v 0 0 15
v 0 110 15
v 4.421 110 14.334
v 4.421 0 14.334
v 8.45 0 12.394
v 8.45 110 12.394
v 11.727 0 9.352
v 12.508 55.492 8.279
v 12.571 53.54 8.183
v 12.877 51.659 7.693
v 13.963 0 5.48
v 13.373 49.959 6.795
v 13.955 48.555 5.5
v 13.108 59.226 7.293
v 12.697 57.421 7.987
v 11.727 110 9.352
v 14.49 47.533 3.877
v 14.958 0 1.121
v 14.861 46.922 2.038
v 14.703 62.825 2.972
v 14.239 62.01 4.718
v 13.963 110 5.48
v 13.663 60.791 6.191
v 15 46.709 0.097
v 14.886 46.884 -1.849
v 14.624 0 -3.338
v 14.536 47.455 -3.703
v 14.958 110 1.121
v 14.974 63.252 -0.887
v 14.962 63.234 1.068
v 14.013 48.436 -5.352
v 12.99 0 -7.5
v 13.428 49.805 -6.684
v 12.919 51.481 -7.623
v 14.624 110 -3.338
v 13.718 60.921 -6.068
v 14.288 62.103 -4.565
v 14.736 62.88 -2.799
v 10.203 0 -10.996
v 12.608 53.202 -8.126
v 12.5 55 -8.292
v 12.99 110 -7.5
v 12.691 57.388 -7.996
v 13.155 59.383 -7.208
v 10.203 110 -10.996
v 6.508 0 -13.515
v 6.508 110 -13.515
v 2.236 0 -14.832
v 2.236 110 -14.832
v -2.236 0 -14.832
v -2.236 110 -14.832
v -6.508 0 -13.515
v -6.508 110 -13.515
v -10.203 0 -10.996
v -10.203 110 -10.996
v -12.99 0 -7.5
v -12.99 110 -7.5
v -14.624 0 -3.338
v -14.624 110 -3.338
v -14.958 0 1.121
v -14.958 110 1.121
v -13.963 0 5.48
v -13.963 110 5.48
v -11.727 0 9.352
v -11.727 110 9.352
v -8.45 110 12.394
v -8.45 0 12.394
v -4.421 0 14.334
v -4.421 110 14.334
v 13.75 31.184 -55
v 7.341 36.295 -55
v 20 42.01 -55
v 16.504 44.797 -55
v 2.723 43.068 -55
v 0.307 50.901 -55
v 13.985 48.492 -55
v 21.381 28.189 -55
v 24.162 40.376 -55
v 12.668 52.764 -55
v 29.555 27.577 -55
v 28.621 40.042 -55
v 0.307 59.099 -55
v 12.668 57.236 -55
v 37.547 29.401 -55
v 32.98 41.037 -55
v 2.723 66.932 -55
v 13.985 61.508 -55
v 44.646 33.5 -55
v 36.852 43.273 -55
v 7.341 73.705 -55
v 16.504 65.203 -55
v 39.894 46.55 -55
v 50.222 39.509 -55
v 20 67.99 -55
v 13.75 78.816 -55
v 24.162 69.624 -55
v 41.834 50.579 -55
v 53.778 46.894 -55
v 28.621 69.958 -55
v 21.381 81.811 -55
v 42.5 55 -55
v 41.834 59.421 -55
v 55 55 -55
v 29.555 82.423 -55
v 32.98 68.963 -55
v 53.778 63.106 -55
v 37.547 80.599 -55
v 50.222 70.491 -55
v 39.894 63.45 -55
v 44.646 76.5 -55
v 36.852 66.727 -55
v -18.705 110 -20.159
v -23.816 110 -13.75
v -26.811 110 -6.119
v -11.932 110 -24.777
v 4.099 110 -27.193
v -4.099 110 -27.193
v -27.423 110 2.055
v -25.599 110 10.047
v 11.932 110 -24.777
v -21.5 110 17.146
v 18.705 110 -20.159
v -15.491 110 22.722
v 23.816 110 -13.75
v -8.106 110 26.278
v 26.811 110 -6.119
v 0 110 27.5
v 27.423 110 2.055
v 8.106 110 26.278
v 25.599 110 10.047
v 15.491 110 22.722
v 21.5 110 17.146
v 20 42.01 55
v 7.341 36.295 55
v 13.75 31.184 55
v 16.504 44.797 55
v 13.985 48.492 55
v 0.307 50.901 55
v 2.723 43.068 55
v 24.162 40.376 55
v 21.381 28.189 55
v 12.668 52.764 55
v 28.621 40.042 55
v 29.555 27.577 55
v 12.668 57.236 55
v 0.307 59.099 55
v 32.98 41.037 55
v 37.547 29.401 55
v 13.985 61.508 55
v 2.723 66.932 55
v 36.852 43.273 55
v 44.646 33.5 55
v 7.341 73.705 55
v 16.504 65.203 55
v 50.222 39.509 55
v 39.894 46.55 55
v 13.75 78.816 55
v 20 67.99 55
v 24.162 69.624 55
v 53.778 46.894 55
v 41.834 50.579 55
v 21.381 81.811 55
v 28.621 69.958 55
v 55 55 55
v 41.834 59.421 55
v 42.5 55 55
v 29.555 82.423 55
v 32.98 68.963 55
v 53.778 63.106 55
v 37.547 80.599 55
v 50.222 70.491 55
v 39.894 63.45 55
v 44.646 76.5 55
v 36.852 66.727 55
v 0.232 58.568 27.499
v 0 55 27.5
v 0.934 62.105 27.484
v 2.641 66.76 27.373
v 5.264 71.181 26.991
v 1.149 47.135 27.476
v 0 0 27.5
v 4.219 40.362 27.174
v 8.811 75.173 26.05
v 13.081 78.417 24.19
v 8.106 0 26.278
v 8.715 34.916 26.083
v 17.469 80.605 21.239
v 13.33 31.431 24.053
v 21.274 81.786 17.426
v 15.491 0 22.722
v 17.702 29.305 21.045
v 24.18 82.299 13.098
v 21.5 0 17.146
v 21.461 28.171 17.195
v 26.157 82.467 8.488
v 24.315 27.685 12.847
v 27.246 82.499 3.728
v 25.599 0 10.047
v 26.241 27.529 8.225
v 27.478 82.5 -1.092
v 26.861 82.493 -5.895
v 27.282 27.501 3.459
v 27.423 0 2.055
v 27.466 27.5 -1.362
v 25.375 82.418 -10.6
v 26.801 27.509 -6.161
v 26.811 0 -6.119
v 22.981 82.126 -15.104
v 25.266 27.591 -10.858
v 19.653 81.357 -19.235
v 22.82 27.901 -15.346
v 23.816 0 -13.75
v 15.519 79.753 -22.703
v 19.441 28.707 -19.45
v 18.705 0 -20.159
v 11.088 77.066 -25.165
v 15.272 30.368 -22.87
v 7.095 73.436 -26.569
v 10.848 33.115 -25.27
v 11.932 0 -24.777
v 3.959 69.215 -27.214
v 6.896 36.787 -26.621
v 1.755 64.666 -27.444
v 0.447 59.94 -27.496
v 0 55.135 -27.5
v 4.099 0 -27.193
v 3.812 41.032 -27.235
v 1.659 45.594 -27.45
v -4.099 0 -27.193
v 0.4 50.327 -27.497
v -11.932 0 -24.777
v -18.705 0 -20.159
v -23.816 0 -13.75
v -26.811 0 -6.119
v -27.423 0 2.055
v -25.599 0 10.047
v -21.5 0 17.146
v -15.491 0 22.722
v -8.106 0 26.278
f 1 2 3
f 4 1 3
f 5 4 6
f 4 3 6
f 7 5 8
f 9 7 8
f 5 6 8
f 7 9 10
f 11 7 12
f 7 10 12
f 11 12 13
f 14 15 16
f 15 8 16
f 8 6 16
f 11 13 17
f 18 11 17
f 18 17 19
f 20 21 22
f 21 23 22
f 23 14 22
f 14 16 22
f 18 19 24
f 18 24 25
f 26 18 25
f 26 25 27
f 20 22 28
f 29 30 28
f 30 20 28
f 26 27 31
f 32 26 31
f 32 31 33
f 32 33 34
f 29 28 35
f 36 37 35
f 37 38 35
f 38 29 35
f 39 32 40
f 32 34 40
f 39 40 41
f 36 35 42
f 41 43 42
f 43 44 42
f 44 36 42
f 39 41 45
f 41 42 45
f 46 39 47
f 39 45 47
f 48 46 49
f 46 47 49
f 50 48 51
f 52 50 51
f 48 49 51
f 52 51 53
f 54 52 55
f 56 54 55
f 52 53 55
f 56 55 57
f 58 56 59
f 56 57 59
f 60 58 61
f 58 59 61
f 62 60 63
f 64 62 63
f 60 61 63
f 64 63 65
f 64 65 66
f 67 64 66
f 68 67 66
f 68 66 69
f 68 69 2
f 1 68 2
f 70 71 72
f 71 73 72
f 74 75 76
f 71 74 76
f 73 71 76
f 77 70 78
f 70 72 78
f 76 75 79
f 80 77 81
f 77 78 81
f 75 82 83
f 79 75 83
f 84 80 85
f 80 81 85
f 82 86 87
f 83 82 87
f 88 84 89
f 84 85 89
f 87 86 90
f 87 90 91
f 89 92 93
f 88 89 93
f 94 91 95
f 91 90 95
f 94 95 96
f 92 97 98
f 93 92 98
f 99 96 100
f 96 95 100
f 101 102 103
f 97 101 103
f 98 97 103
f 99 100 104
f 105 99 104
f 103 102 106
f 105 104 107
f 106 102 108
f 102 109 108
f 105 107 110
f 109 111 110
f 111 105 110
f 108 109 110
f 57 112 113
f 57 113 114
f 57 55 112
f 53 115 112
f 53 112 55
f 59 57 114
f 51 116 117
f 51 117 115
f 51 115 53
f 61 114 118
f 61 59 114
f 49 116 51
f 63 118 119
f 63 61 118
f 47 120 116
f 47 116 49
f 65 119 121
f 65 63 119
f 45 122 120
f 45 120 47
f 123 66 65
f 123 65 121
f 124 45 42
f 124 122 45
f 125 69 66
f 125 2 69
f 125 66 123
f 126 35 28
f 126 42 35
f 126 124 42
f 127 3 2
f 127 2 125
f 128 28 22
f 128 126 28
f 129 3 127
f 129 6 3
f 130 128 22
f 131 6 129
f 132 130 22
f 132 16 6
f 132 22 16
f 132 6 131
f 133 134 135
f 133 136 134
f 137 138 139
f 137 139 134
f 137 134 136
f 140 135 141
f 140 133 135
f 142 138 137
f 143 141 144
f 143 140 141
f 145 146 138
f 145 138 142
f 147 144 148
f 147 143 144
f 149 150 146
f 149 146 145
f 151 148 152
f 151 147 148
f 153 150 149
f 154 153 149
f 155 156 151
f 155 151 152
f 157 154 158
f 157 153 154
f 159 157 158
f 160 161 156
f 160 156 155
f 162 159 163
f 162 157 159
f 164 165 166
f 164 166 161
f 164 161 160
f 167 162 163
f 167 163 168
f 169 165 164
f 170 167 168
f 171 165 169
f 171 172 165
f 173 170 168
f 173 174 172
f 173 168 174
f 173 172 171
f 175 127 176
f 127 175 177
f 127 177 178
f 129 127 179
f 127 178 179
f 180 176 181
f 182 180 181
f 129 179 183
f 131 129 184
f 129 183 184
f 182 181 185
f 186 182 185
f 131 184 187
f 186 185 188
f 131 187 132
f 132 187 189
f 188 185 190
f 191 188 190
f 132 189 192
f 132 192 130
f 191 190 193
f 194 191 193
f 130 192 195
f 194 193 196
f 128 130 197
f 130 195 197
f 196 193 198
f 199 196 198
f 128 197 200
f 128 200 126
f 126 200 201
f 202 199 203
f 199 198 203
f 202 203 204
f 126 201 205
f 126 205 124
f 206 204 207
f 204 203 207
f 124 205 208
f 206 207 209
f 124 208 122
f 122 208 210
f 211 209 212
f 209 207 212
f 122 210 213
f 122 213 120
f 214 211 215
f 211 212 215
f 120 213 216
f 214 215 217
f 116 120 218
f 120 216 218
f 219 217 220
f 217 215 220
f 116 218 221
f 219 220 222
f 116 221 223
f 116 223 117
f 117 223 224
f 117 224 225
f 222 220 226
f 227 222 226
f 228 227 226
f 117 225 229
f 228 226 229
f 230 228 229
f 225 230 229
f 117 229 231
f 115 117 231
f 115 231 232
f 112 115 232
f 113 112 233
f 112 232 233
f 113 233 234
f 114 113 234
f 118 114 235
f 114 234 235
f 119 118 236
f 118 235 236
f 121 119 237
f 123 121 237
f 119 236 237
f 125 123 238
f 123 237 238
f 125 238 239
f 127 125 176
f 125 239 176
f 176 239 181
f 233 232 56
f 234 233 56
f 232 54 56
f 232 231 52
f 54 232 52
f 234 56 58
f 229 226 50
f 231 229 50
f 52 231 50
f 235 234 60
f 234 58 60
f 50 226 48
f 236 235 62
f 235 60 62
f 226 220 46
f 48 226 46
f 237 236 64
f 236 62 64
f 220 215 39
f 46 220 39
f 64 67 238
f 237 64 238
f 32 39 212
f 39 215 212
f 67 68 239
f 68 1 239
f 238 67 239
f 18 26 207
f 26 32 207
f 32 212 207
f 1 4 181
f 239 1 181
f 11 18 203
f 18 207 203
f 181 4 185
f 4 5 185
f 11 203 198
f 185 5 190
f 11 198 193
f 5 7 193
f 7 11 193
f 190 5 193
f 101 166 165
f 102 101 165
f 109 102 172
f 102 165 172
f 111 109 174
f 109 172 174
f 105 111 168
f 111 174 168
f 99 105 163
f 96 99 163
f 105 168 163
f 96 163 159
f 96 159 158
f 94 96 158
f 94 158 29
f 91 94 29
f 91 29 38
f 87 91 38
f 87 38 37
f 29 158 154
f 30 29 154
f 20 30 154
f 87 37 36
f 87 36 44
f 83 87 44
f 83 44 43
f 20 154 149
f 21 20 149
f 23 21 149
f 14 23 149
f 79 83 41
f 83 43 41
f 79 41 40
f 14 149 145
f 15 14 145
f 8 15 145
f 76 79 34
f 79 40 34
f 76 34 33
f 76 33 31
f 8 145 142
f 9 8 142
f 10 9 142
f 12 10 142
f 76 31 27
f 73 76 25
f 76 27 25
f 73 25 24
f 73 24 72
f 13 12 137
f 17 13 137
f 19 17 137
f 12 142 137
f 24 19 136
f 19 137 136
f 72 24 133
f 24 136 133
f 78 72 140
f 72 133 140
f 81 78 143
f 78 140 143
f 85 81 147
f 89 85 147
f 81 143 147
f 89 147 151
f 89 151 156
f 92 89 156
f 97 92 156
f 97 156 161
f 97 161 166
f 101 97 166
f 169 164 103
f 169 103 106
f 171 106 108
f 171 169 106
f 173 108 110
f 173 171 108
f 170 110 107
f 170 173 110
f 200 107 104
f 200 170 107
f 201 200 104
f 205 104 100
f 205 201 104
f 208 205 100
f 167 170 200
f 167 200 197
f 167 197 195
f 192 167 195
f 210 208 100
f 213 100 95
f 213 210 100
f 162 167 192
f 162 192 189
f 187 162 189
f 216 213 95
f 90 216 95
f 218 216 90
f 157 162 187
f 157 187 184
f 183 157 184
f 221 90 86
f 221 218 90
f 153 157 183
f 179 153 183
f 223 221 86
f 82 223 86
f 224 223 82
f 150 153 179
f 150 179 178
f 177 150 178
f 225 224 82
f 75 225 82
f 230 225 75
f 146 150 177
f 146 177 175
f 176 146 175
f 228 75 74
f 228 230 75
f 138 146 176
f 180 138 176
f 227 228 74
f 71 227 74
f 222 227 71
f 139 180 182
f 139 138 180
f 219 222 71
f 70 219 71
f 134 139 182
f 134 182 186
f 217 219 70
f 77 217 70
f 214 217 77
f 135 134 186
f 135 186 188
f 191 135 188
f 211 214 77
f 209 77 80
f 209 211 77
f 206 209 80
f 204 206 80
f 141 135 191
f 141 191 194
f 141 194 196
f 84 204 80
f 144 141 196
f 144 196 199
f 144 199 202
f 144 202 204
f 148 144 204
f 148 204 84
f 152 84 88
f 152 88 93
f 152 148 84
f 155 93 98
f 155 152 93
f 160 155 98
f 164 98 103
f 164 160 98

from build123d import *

# Parameters (mm, degrees)
SKETCH1_R           = 27.5
BOSS_EXTRUDE2_DEPTH = 110
SKETCH2_R           = 27.5
BOSS_EXTRUDE3_DEPTH = 55
SKETCH3_R           = 15
CUT_EXTRUDE1_DEPTH  = 110
SKETCH5_R           = 15
CUT_EXTRUDE2_DEPTH  = 110


with BuildPart() as part:
    # Sketch1 → Boss-Extrude2 (new body)
    with BuildSketch(Plane(origin=(0, 0, 0), x_dir=(1, 0, 0), z_dir=(0, 1, 0))):
        with Locations(Location((0, 0, 0), (0, 0, 270))):
            Circle(SKETCH1_R)
    extrude(amount=BOSS_EXTRUDE2_DEPTH)

    # Sketch2 → Boss-Extrude3 (add, symmetric)
    with BuildSketch(Plane.XY):
        with Locations((27.5, 55)):
            Circle(SKETCH2_R)
    extrude(amount=BOSS_EXTRUDE3_DEPTH, both=True)

    # Sketch3 → Cut-Extrude1 (cut)
    with BuildSketch(Plane(origin=(0, 110, 0), x_dir=(1, 0, 0), z_dir=(0, 1, 0))):
        with Locations(Location((0, 0, 0), (0, 0, 270))):
            Circle(SKETCH3_R)
    extrude(amount=-CUT_EXTRUDE1_DEPTH, mode=Mode.SUBTRACT)

    # Sketch5 → Cut-Extrude2 (cut)
    with BuildSketch(Plane.XY.offset(55)):
        with Locations((27.5, 55)):
            Circle(SKETCH5_R)
    extrude(amount=-CUT_EXTRUDE2_DEPTH, mode=Mode.SUBTRACT)


solid = part.part
